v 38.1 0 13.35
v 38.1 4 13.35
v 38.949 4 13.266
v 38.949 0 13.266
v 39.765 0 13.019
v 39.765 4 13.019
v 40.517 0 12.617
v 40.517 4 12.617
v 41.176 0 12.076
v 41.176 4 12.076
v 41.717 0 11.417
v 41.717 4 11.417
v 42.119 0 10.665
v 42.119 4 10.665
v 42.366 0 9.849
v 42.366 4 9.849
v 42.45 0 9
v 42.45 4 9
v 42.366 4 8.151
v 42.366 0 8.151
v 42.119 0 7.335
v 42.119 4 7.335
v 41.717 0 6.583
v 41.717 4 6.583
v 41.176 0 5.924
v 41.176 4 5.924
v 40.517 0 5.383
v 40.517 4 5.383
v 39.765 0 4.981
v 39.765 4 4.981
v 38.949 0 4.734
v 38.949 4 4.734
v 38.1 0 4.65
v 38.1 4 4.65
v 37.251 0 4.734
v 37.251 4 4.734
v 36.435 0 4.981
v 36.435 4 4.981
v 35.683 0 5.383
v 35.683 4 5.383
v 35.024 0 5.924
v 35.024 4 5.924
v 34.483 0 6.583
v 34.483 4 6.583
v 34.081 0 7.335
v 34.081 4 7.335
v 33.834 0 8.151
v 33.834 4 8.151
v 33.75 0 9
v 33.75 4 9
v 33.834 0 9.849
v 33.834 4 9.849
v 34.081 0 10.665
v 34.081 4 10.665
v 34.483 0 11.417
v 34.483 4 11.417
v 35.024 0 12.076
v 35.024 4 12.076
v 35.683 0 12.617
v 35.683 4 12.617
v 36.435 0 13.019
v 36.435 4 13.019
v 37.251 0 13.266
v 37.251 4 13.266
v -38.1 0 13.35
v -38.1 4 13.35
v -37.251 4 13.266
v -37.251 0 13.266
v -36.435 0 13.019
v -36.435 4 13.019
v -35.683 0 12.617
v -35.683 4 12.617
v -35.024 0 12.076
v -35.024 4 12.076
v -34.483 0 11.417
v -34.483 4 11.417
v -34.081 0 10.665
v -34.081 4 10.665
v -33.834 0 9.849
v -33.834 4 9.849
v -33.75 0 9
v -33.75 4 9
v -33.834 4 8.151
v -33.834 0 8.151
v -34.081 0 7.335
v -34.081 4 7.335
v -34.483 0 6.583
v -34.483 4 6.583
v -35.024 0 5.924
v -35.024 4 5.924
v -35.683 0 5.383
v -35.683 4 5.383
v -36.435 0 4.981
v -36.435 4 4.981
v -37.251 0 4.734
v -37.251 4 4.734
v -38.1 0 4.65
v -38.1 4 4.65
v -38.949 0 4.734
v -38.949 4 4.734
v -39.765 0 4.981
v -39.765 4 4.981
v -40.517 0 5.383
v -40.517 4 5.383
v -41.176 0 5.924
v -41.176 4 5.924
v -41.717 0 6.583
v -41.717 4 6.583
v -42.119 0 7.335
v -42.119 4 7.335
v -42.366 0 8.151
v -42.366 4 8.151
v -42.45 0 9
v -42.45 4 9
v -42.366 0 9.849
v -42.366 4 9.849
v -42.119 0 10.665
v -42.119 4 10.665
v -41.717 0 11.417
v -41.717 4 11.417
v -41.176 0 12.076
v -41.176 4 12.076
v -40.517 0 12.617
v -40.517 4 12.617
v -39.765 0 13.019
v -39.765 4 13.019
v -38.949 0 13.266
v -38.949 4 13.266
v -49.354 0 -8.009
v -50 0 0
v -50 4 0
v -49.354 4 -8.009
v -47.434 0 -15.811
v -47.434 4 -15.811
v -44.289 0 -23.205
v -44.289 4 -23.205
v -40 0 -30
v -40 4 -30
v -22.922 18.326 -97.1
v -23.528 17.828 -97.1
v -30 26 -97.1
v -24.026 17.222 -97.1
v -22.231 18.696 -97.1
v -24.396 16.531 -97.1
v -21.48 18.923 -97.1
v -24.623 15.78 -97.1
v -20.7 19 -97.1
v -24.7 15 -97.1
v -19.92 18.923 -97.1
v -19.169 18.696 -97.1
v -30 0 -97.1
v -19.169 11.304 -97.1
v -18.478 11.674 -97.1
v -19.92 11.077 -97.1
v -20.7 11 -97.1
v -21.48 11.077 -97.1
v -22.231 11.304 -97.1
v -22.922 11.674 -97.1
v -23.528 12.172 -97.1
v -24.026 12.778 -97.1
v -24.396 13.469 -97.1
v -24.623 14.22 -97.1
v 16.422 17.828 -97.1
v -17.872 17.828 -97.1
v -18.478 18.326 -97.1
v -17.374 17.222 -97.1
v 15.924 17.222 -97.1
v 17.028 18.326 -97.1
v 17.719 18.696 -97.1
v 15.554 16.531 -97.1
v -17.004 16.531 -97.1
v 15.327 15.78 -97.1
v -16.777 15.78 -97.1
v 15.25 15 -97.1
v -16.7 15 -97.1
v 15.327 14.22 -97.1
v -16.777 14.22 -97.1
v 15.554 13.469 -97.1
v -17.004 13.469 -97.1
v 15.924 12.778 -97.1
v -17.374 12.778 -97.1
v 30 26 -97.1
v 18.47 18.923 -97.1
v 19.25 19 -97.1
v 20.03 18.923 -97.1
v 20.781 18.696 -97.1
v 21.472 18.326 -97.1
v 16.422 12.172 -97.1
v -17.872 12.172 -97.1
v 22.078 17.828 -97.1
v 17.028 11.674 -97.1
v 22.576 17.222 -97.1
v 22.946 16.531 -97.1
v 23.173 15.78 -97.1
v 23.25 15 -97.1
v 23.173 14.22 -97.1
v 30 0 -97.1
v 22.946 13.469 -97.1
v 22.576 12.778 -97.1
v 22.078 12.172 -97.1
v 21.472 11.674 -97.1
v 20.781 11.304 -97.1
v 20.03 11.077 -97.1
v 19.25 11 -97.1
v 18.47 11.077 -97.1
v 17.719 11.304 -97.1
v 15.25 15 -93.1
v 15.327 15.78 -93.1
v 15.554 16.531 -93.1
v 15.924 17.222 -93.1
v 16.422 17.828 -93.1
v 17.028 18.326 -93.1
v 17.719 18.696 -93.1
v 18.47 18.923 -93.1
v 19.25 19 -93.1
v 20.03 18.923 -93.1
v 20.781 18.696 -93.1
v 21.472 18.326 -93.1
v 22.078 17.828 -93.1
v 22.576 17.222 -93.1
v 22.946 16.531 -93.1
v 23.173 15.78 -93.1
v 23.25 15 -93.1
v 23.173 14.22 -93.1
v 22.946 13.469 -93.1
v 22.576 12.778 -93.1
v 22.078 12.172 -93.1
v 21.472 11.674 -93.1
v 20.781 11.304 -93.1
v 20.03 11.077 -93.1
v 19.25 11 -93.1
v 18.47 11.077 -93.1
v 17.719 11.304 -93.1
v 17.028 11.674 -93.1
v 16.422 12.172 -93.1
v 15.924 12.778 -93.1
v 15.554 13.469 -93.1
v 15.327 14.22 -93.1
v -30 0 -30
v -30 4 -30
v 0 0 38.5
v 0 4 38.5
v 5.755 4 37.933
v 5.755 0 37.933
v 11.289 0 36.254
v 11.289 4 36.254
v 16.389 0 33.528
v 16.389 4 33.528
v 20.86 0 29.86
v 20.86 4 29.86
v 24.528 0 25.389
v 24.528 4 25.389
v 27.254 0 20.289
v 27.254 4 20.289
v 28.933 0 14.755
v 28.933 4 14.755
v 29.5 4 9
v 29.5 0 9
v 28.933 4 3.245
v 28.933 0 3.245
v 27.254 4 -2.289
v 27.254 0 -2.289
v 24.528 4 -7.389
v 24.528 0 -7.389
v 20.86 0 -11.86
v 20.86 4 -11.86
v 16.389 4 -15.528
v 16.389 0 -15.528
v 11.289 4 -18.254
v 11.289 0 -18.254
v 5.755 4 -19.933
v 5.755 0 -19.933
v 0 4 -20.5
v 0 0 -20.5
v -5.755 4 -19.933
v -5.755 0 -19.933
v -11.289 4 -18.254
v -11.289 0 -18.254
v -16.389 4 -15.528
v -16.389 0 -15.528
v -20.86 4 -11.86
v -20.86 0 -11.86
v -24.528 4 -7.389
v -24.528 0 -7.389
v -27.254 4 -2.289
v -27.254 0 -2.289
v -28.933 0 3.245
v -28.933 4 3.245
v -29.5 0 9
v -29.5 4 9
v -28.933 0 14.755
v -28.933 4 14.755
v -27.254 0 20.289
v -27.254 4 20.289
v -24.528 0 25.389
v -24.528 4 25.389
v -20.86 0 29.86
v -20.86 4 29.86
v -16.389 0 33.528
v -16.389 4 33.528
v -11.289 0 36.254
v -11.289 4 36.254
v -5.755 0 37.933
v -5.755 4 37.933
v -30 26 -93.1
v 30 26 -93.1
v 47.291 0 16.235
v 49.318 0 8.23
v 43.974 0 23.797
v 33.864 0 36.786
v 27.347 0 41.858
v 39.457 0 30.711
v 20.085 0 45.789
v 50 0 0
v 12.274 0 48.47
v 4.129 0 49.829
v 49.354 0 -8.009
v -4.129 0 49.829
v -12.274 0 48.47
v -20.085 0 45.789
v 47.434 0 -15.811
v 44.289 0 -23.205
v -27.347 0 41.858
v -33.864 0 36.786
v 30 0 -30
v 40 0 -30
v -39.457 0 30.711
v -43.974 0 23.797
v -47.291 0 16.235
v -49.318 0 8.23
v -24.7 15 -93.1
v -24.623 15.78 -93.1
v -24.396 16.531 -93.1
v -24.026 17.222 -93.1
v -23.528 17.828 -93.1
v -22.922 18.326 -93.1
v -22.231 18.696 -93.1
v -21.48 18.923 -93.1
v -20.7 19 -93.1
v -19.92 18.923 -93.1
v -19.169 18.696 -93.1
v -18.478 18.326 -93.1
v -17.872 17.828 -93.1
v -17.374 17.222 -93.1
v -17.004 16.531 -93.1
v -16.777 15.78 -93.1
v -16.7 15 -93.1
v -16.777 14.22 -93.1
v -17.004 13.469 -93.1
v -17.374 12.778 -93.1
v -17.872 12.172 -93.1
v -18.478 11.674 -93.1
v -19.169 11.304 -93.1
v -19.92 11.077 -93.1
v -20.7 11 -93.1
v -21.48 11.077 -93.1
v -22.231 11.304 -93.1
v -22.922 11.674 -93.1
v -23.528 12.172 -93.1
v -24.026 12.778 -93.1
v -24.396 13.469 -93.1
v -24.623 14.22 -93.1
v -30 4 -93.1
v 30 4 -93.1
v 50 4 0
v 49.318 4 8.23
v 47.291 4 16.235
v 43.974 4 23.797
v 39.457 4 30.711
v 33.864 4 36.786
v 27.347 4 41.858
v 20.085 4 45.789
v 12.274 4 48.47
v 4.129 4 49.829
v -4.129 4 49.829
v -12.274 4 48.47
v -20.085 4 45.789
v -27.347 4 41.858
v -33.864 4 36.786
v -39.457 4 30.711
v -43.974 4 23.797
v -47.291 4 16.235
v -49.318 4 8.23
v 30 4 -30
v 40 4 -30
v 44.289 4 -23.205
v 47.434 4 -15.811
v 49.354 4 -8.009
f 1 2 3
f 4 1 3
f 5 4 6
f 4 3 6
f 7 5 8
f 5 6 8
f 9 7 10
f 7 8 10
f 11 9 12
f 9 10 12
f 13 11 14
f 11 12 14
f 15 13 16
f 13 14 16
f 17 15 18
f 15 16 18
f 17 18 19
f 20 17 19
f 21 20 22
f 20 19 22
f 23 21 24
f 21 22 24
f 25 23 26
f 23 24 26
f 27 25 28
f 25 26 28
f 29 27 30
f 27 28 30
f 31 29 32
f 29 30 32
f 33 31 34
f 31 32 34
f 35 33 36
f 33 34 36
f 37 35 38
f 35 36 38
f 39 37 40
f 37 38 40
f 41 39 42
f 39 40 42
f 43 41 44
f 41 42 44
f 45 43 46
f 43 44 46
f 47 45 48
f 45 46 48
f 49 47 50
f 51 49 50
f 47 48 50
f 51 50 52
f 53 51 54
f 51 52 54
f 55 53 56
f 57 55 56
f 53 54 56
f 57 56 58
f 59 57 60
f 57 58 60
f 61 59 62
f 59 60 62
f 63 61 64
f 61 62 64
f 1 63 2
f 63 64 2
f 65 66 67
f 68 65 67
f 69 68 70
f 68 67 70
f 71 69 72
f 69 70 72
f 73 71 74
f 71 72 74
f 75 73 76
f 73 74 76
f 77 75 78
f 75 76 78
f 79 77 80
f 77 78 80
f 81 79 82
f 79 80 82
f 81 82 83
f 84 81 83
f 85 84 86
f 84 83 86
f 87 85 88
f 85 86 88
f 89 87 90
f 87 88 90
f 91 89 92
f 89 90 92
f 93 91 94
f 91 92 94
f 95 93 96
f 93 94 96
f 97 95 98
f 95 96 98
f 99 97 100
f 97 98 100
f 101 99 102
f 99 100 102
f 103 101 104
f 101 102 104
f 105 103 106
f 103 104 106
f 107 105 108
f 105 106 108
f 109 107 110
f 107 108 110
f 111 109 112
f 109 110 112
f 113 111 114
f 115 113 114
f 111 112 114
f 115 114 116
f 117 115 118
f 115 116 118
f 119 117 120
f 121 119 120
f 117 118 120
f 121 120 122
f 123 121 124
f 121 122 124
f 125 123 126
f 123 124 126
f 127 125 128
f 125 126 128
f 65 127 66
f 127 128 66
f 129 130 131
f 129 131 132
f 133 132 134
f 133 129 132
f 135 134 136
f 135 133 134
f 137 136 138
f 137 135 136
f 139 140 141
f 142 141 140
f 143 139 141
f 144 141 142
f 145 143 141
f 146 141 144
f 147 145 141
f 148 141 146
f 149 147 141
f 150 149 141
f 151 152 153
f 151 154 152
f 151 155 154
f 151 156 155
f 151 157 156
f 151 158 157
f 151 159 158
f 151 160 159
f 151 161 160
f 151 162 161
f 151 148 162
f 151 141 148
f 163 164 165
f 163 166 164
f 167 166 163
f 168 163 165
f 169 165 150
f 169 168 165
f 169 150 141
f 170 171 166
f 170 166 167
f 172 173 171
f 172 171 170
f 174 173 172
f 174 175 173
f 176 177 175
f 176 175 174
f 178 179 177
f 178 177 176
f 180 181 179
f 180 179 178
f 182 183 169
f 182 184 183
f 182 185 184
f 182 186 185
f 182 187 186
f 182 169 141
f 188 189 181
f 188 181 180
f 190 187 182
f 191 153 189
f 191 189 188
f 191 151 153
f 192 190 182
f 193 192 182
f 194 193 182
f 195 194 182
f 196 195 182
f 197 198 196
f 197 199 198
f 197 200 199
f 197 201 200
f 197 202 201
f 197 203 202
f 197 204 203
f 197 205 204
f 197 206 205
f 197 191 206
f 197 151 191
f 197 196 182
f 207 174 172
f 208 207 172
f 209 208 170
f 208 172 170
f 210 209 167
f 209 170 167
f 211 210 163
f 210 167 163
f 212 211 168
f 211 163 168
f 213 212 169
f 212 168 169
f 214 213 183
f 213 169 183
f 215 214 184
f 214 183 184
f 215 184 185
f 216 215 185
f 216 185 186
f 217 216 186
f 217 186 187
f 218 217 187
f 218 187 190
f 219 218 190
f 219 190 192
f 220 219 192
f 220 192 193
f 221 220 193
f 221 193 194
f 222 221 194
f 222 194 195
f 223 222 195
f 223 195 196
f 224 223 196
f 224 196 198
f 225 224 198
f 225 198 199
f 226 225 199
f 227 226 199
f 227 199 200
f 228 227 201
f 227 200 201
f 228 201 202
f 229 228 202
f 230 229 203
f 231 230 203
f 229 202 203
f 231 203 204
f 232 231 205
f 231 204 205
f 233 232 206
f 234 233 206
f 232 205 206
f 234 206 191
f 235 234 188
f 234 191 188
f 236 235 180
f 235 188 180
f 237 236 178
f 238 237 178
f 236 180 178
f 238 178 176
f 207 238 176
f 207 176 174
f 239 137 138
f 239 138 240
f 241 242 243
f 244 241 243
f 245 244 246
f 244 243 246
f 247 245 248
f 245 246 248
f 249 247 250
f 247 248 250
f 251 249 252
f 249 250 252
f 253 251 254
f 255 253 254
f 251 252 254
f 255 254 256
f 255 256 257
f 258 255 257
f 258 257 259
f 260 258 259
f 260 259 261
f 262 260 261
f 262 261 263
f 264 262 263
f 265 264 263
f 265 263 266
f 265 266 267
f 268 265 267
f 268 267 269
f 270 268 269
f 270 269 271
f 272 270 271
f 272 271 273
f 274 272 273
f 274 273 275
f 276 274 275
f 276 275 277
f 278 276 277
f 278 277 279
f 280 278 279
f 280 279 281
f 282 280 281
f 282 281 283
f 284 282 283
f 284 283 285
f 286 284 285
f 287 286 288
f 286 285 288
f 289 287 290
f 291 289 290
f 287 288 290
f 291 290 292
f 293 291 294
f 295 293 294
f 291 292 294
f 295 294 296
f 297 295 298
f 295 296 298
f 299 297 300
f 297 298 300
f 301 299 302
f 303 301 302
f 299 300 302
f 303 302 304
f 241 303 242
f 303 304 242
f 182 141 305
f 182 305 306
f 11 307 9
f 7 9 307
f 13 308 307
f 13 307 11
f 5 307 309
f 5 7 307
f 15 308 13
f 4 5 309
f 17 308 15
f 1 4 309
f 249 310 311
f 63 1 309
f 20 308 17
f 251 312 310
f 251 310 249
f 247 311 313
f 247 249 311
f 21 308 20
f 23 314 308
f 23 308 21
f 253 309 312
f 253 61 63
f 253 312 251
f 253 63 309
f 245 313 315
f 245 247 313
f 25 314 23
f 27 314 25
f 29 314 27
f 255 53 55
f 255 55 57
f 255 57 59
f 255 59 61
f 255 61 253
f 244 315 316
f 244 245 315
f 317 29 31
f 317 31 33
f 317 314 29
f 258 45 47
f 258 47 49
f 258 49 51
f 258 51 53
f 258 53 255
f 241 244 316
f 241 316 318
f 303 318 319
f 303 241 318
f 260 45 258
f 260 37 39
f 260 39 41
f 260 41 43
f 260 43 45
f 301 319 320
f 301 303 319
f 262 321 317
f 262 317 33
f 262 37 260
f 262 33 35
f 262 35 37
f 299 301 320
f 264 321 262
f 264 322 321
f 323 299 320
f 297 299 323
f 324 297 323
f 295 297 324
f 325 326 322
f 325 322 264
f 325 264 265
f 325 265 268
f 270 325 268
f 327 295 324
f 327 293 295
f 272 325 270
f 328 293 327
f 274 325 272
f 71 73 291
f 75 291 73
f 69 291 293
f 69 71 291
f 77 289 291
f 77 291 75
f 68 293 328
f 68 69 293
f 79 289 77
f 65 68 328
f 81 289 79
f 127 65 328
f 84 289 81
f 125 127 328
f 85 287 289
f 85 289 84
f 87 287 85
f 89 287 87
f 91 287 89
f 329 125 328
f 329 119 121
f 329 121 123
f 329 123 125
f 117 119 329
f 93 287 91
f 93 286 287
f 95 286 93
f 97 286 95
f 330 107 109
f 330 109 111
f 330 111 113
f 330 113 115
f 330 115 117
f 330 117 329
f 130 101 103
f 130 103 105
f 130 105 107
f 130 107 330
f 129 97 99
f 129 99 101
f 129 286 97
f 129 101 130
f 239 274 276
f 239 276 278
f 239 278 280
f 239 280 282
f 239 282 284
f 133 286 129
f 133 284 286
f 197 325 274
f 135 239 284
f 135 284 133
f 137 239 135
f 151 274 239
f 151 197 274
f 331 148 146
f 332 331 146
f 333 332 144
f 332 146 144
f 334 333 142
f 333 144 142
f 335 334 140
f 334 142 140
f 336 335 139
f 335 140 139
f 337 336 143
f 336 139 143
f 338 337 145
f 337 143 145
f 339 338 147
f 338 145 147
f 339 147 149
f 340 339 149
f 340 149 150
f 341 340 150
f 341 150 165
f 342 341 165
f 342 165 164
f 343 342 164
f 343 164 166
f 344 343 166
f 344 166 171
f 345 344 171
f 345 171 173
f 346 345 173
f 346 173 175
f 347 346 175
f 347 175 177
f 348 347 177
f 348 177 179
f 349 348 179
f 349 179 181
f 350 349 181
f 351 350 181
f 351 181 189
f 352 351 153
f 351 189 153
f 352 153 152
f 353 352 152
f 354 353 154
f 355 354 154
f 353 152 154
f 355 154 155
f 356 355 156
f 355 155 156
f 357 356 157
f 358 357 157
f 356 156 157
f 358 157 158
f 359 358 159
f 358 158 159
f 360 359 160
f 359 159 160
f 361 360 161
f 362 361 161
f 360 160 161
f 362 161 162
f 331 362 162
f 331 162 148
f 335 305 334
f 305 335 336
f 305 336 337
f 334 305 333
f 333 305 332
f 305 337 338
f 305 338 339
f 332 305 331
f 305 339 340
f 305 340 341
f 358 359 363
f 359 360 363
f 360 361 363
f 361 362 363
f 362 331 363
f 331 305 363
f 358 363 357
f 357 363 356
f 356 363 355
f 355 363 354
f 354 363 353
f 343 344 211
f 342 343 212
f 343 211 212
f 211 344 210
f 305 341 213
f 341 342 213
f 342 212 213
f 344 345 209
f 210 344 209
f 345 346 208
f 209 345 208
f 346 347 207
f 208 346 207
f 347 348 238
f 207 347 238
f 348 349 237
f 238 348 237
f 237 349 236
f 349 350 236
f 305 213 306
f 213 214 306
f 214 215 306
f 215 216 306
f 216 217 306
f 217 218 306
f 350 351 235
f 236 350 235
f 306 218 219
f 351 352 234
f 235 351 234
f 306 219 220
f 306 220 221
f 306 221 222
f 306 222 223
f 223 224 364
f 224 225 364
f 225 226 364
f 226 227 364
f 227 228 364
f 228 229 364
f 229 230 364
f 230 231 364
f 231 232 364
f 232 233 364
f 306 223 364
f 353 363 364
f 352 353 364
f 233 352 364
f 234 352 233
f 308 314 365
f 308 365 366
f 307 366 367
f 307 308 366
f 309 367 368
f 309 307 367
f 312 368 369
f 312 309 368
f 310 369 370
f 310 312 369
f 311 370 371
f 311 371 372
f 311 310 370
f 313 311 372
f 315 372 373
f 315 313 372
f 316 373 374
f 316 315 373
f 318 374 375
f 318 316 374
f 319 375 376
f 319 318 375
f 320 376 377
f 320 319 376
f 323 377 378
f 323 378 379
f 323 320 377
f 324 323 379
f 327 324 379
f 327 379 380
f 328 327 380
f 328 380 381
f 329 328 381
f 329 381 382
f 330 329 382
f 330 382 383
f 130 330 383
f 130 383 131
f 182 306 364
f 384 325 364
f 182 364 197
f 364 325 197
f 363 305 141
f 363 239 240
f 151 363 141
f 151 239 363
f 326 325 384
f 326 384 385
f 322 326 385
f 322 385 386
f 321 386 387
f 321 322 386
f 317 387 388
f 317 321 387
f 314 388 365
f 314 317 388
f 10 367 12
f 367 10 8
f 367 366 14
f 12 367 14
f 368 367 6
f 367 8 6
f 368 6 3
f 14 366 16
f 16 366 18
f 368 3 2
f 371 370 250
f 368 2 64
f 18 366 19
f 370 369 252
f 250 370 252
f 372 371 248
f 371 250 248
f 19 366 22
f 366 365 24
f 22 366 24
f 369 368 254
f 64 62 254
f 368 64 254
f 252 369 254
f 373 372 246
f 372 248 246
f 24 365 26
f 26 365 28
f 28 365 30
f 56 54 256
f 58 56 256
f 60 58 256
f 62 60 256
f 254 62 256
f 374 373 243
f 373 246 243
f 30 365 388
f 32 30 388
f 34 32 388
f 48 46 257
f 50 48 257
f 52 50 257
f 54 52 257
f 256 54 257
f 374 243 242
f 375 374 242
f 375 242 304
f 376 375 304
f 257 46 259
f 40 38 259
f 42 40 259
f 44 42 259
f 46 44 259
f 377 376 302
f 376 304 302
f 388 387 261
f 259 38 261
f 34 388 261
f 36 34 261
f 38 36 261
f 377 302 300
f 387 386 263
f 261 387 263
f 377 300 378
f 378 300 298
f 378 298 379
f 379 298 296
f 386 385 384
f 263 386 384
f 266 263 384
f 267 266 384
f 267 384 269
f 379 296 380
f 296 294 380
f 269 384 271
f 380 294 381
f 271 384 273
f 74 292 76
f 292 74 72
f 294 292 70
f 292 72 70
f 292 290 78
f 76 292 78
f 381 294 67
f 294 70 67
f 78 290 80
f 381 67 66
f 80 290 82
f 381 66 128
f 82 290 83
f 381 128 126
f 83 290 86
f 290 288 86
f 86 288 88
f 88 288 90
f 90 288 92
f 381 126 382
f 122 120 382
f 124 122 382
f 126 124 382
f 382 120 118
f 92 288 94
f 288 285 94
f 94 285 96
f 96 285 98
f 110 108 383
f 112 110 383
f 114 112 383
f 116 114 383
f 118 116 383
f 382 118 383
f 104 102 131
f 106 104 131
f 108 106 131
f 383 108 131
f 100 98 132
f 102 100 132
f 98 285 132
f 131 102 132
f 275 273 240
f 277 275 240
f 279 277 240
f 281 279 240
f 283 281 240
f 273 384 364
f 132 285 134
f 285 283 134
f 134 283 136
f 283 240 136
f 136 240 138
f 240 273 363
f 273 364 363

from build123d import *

# Parameters (mm, degrees)
BOSS_EXTRUDE1_DEPTH = 4
SKETCH2_R           = 4.35
CUT_EXTRUDE1_DEPTH  = 4
SKETCH8_W           = 60
SKETCH8_H           = 4
BOSS_EXTRUDE4_DEPTH = 67.1
SKETCH10_W          = 60
SKETCH10_H          = 4
BOSS_EXTRUDE6_DEPTH = 22
SKETCH11_R          = 4
CUT_EXTRUDE2_DEPTH  = 20
SKETCH12_R          = 29.5
CUT_EXTRUDE3_DEPTH  = 10


with BuildPart() as part:
    # Sketch1 → Boss-Extrude1 (new body)
    with BuildSketch(Plane(origin=(0, 0, 0), x_dir=(1, 0, 0), z_dir=(0, 1, 0))):
        with BuildLine():
            Line((-40, 30), (40, 30))
            ThreePointArc((40, 30), (47.434164903, 15.811388301), (50, 0))
            ThreePointArc((50, 0), (0, -50), (-50, 0))
            ThreePointArc((-50, 0), (-47.434164903, 15.811388301), (-40, 30))
        make_face()
    extrude(amount=BOSS_EXTRUDE1_DEPTH)

    # Sketch2 → Cut-Extrude1 (cut)
    with BuildSketch(Plane(origin=(0, 4, 0), x_dir=(1, 0, 0), z_dir=(0, 1, 0))):
        with Locations(Location((-38.1, -9, 0), (0, 0, 270))):
            Circle(SKETCH2_R)
        with Locations(Location((38.1, -9, 0), (0, 0, 270))):
            Circle(SKETCH2_R)
    extrude(amount=-CUT_EXTRUDE1_DEPTH, mode=Mode.SUBTRACT)

    # Sketch8 → Boss-Extrude4 (add)
    with BuildSketch(Plane(origin=(0, 0, -30), x_dir=(-1, 0, 0), z_dir=(0, 0, -1))):
        with Locations((0, 2)):
            Rectangle(SKETCH8_W, SKETCH8_H)
    extrude(amount=BOSS_EXTRUDE4_DEPTH)

    # Sketch10 → Boss-Extrude6 (add)
    with BuildSketch(Plane(origin=(0, 4, 0), x_dir=(1, 0, 0), z_dir=(0, 1, 0))):
        with Locations((0, 95.1)):
            Rectangle(SKETCH10_W, SKETCH10_H)
    extrude(amount=BOSS_EXTRUDE6_DEPTH)

    # Sketch11 → Cut-Extrude2 (cut)
    with BuildSketch(Plane(origin=(0, 0, -97.1), x_dir=(-1, 0, 0), z_dir=(0, 0, -1))):
        with Locations((-19.25, 15)):
            Circle(SKETCH11_R)
        with Locations((20.7, 15)):
            Circle(SKETCH11_R)
    extrude(amount=-CUT_EXTRUDE2_DEPTH, mode=Mode.SUBTRACT)

    # Sketch12 → Cut-Extrude3 (cut)
    with BuildSketch(Plane(origin=(0, 4, 0), x_dir=(1, 0, 0), z_dir=(0, 1, 0))):
        with Locations(Location((0, -9, 0), (0, 0, 270))):
            Circle(SKETCH12_R)
    extrude(amount=-CUT_EXTRUDE3_DEPTH, mode=Mode.SUBTRACT)


solid = part.part
